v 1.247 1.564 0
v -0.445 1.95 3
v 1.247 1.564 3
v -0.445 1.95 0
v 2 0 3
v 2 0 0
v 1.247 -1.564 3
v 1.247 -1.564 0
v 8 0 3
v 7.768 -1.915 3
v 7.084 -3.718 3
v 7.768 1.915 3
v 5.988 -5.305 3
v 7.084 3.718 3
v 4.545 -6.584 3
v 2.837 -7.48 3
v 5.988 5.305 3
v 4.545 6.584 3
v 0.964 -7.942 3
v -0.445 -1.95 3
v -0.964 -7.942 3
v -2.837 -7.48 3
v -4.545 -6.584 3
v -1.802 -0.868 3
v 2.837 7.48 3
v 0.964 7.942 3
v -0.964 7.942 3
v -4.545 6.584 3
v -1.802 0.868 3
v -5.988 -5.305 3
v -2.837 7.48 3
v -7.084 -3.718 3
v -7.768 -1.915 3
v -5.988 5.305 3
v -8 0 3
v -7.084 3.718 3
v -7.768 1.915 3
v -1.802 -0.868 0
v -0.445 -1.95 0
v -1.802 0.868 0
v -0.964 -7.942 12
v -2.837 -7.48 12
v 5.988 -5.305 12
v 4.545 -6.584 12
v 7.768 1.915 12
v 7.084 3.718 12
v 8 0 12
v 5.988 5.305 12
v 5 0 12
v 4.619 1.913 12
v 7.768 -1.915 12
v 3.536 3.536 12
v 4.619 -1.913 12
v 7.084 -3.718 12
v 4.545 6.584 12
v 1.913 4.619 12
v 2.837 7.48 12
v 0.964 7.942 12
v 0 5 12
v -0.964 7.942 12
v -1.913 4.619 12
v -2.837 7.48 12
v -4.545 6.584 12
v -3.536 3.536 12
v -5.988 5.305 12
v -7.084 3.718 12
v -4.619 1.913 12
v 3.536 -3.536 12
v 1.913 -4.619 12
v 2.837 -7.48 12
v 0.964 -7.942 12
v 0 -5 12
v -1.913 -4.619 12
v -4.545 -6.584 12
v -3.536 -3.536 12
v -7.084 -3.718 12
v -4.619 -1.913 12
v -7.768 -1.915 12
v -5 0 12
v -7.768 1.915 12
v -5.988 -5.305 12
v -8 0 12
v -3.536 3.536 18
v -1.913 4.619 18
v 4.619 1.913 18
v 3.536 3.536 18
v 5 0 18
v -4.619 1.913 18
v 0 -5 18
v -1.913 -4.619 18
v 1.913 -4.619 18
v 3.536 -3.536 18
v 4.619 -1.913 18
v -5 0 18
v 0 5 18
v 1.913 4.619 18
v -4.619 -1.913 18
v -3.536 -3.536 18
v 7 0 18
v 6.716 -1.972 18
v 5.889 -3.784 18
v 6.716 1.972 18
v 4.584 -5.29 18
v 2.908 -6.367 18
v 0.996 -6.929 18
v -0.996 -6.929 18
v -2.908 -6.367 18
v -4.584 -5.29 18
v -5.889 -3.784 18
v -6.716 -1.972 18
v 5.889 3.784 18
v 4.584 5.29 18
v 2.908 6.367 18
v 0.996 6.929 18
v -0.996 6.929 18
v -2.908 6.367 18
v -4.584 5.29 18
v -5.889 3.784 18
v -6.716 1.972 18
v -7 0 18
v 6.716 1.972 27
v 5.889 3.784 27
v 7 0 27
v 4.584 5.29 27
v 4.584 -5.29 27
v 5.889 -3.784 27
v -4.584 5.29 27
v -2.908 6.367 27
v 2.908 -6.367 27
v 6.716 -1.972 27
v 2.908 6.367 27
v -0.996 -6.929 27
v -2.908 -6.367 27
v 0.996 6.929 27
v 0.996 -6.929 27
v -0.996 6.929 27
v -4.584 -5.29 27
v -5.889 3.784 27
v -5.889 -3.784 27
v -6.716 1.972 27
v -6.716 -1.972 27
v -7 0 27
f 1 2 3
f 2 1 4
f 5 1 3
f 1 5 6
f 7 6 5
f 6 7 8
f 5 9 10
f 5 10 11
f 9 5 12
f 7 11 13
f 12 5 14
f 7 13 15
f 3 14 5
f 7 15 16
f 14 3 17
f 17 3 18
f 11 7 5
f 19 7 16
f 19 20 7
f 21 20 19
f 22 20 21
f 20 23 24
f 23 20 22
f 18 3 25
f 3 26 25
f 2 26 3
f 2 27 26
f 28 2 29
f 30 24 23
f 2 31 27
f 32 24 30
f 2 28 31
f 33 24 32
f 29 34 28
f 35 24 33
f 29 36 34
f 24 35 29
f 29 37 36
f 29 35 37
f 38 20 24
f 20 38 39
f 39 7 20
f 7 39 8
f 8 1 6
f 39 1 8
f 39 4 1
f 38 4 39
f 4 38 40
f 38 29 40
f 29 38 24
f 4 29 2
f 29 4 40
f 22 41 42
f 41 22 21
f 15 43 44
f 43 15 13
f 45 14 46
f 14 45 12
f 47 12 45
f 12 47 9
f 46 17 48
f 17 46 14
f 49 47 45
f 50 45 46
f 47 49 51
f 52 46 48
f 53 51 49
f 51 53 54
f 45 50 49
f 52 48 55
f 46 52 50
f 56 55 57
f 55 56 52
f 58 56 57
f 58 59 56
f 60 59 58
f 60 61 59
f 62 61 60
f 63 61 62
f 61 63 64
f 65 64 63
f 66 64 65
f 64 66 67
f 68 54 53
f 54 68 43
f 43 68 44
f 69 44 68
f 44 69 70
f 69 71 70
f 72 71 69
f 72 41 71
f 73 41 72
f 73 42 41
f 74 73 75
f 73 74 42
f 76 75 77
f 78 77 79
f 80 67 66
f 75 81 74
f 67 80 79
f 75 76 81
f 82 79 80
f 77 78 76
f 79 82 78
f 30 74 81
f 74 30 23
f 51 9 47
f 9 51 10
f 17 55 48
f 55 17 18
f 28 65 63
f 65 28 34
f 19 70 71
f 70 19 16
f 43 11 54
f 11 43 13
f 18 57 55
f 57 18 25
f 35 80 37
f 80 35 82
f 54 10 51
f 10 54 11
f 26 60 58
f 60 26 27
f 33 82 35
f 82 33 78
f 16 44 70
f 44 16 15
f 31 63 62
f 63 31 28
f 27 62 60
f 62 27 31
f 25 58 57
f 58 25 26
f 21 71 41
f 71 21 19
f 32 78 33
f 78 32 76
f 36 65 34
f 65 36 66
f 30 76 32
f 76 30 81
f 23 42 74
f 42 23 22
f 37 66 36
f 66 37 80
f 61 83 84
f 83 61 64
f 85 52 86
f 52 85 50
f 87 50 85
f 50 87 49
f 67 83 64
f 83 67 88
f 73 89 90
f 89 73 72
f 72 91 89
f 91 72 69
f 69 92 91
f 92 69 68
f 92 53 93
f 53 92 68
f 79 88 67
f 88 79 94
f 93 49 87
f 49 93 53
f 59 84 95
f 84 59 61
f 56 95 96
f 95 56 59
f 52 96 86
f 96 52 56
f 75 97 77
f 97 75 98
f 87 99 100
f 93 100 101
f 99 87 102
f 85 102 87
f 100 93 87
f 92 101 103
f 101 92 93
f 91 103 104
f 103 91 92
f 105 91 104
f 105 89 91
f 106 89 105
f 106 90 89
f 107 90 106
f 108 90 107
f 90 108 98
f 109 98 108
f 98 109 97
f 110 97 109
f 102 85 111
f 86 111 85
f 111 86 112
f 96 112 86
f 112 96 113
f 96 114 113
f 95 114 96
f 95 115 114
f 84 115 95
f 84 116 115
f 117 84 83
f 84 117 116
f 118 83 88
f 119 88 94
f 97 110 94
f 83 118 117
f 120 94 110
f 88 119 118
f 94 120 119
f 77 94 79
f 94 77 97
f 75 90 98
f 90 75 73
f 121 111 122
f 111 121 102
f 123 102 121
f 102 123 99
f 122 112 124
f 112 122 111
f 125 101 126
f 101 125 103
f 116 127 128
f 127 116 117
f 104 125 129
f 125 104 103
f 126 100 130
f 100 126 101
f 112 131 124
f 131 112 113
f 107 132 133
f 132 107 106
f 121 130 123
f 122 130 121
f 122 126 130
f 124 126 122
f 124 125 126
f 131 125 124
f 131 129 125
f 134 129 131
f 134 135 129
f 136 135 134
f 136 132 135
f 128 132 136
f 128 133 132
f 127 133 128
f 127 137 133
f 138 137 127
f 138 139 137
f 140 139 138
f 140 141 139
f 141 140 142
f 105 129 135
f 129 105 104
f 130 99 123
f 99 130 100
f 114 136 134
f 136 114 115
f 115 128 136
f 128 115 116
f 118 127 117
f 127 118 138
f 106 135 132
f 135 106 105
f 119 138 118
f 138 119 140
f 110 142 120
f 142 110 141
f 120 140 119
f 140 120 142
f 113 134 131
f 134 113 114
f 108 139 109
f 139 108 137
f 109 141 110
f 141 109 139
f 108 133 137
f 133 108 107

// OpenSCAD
// [inibitore, facce, altezza]
genome = [1,2,3,0,5,6,1,8,9,1,5,6,0,3,4,0,7,8,1,7,9];
gene_len=3;
function altezz(index) = ( index == 0 ? 0 : genome[index-3]*genome[index-1] + altezz(index-3) ); 

for (g=[0:gene_len:len(genome)-gene_len]){
    
    echo (altezz(g));

    inibitore = genome[g];
    facce = genome[g+1];
    altezza = genome[g+2];
    if(inibitore==1){ 
        // echo(genome[g], genome[g+1], genome[g+2]);
        translate([0,0,altezz(g)])
            cylinder(h = altezza, r = facce);
    }

}
